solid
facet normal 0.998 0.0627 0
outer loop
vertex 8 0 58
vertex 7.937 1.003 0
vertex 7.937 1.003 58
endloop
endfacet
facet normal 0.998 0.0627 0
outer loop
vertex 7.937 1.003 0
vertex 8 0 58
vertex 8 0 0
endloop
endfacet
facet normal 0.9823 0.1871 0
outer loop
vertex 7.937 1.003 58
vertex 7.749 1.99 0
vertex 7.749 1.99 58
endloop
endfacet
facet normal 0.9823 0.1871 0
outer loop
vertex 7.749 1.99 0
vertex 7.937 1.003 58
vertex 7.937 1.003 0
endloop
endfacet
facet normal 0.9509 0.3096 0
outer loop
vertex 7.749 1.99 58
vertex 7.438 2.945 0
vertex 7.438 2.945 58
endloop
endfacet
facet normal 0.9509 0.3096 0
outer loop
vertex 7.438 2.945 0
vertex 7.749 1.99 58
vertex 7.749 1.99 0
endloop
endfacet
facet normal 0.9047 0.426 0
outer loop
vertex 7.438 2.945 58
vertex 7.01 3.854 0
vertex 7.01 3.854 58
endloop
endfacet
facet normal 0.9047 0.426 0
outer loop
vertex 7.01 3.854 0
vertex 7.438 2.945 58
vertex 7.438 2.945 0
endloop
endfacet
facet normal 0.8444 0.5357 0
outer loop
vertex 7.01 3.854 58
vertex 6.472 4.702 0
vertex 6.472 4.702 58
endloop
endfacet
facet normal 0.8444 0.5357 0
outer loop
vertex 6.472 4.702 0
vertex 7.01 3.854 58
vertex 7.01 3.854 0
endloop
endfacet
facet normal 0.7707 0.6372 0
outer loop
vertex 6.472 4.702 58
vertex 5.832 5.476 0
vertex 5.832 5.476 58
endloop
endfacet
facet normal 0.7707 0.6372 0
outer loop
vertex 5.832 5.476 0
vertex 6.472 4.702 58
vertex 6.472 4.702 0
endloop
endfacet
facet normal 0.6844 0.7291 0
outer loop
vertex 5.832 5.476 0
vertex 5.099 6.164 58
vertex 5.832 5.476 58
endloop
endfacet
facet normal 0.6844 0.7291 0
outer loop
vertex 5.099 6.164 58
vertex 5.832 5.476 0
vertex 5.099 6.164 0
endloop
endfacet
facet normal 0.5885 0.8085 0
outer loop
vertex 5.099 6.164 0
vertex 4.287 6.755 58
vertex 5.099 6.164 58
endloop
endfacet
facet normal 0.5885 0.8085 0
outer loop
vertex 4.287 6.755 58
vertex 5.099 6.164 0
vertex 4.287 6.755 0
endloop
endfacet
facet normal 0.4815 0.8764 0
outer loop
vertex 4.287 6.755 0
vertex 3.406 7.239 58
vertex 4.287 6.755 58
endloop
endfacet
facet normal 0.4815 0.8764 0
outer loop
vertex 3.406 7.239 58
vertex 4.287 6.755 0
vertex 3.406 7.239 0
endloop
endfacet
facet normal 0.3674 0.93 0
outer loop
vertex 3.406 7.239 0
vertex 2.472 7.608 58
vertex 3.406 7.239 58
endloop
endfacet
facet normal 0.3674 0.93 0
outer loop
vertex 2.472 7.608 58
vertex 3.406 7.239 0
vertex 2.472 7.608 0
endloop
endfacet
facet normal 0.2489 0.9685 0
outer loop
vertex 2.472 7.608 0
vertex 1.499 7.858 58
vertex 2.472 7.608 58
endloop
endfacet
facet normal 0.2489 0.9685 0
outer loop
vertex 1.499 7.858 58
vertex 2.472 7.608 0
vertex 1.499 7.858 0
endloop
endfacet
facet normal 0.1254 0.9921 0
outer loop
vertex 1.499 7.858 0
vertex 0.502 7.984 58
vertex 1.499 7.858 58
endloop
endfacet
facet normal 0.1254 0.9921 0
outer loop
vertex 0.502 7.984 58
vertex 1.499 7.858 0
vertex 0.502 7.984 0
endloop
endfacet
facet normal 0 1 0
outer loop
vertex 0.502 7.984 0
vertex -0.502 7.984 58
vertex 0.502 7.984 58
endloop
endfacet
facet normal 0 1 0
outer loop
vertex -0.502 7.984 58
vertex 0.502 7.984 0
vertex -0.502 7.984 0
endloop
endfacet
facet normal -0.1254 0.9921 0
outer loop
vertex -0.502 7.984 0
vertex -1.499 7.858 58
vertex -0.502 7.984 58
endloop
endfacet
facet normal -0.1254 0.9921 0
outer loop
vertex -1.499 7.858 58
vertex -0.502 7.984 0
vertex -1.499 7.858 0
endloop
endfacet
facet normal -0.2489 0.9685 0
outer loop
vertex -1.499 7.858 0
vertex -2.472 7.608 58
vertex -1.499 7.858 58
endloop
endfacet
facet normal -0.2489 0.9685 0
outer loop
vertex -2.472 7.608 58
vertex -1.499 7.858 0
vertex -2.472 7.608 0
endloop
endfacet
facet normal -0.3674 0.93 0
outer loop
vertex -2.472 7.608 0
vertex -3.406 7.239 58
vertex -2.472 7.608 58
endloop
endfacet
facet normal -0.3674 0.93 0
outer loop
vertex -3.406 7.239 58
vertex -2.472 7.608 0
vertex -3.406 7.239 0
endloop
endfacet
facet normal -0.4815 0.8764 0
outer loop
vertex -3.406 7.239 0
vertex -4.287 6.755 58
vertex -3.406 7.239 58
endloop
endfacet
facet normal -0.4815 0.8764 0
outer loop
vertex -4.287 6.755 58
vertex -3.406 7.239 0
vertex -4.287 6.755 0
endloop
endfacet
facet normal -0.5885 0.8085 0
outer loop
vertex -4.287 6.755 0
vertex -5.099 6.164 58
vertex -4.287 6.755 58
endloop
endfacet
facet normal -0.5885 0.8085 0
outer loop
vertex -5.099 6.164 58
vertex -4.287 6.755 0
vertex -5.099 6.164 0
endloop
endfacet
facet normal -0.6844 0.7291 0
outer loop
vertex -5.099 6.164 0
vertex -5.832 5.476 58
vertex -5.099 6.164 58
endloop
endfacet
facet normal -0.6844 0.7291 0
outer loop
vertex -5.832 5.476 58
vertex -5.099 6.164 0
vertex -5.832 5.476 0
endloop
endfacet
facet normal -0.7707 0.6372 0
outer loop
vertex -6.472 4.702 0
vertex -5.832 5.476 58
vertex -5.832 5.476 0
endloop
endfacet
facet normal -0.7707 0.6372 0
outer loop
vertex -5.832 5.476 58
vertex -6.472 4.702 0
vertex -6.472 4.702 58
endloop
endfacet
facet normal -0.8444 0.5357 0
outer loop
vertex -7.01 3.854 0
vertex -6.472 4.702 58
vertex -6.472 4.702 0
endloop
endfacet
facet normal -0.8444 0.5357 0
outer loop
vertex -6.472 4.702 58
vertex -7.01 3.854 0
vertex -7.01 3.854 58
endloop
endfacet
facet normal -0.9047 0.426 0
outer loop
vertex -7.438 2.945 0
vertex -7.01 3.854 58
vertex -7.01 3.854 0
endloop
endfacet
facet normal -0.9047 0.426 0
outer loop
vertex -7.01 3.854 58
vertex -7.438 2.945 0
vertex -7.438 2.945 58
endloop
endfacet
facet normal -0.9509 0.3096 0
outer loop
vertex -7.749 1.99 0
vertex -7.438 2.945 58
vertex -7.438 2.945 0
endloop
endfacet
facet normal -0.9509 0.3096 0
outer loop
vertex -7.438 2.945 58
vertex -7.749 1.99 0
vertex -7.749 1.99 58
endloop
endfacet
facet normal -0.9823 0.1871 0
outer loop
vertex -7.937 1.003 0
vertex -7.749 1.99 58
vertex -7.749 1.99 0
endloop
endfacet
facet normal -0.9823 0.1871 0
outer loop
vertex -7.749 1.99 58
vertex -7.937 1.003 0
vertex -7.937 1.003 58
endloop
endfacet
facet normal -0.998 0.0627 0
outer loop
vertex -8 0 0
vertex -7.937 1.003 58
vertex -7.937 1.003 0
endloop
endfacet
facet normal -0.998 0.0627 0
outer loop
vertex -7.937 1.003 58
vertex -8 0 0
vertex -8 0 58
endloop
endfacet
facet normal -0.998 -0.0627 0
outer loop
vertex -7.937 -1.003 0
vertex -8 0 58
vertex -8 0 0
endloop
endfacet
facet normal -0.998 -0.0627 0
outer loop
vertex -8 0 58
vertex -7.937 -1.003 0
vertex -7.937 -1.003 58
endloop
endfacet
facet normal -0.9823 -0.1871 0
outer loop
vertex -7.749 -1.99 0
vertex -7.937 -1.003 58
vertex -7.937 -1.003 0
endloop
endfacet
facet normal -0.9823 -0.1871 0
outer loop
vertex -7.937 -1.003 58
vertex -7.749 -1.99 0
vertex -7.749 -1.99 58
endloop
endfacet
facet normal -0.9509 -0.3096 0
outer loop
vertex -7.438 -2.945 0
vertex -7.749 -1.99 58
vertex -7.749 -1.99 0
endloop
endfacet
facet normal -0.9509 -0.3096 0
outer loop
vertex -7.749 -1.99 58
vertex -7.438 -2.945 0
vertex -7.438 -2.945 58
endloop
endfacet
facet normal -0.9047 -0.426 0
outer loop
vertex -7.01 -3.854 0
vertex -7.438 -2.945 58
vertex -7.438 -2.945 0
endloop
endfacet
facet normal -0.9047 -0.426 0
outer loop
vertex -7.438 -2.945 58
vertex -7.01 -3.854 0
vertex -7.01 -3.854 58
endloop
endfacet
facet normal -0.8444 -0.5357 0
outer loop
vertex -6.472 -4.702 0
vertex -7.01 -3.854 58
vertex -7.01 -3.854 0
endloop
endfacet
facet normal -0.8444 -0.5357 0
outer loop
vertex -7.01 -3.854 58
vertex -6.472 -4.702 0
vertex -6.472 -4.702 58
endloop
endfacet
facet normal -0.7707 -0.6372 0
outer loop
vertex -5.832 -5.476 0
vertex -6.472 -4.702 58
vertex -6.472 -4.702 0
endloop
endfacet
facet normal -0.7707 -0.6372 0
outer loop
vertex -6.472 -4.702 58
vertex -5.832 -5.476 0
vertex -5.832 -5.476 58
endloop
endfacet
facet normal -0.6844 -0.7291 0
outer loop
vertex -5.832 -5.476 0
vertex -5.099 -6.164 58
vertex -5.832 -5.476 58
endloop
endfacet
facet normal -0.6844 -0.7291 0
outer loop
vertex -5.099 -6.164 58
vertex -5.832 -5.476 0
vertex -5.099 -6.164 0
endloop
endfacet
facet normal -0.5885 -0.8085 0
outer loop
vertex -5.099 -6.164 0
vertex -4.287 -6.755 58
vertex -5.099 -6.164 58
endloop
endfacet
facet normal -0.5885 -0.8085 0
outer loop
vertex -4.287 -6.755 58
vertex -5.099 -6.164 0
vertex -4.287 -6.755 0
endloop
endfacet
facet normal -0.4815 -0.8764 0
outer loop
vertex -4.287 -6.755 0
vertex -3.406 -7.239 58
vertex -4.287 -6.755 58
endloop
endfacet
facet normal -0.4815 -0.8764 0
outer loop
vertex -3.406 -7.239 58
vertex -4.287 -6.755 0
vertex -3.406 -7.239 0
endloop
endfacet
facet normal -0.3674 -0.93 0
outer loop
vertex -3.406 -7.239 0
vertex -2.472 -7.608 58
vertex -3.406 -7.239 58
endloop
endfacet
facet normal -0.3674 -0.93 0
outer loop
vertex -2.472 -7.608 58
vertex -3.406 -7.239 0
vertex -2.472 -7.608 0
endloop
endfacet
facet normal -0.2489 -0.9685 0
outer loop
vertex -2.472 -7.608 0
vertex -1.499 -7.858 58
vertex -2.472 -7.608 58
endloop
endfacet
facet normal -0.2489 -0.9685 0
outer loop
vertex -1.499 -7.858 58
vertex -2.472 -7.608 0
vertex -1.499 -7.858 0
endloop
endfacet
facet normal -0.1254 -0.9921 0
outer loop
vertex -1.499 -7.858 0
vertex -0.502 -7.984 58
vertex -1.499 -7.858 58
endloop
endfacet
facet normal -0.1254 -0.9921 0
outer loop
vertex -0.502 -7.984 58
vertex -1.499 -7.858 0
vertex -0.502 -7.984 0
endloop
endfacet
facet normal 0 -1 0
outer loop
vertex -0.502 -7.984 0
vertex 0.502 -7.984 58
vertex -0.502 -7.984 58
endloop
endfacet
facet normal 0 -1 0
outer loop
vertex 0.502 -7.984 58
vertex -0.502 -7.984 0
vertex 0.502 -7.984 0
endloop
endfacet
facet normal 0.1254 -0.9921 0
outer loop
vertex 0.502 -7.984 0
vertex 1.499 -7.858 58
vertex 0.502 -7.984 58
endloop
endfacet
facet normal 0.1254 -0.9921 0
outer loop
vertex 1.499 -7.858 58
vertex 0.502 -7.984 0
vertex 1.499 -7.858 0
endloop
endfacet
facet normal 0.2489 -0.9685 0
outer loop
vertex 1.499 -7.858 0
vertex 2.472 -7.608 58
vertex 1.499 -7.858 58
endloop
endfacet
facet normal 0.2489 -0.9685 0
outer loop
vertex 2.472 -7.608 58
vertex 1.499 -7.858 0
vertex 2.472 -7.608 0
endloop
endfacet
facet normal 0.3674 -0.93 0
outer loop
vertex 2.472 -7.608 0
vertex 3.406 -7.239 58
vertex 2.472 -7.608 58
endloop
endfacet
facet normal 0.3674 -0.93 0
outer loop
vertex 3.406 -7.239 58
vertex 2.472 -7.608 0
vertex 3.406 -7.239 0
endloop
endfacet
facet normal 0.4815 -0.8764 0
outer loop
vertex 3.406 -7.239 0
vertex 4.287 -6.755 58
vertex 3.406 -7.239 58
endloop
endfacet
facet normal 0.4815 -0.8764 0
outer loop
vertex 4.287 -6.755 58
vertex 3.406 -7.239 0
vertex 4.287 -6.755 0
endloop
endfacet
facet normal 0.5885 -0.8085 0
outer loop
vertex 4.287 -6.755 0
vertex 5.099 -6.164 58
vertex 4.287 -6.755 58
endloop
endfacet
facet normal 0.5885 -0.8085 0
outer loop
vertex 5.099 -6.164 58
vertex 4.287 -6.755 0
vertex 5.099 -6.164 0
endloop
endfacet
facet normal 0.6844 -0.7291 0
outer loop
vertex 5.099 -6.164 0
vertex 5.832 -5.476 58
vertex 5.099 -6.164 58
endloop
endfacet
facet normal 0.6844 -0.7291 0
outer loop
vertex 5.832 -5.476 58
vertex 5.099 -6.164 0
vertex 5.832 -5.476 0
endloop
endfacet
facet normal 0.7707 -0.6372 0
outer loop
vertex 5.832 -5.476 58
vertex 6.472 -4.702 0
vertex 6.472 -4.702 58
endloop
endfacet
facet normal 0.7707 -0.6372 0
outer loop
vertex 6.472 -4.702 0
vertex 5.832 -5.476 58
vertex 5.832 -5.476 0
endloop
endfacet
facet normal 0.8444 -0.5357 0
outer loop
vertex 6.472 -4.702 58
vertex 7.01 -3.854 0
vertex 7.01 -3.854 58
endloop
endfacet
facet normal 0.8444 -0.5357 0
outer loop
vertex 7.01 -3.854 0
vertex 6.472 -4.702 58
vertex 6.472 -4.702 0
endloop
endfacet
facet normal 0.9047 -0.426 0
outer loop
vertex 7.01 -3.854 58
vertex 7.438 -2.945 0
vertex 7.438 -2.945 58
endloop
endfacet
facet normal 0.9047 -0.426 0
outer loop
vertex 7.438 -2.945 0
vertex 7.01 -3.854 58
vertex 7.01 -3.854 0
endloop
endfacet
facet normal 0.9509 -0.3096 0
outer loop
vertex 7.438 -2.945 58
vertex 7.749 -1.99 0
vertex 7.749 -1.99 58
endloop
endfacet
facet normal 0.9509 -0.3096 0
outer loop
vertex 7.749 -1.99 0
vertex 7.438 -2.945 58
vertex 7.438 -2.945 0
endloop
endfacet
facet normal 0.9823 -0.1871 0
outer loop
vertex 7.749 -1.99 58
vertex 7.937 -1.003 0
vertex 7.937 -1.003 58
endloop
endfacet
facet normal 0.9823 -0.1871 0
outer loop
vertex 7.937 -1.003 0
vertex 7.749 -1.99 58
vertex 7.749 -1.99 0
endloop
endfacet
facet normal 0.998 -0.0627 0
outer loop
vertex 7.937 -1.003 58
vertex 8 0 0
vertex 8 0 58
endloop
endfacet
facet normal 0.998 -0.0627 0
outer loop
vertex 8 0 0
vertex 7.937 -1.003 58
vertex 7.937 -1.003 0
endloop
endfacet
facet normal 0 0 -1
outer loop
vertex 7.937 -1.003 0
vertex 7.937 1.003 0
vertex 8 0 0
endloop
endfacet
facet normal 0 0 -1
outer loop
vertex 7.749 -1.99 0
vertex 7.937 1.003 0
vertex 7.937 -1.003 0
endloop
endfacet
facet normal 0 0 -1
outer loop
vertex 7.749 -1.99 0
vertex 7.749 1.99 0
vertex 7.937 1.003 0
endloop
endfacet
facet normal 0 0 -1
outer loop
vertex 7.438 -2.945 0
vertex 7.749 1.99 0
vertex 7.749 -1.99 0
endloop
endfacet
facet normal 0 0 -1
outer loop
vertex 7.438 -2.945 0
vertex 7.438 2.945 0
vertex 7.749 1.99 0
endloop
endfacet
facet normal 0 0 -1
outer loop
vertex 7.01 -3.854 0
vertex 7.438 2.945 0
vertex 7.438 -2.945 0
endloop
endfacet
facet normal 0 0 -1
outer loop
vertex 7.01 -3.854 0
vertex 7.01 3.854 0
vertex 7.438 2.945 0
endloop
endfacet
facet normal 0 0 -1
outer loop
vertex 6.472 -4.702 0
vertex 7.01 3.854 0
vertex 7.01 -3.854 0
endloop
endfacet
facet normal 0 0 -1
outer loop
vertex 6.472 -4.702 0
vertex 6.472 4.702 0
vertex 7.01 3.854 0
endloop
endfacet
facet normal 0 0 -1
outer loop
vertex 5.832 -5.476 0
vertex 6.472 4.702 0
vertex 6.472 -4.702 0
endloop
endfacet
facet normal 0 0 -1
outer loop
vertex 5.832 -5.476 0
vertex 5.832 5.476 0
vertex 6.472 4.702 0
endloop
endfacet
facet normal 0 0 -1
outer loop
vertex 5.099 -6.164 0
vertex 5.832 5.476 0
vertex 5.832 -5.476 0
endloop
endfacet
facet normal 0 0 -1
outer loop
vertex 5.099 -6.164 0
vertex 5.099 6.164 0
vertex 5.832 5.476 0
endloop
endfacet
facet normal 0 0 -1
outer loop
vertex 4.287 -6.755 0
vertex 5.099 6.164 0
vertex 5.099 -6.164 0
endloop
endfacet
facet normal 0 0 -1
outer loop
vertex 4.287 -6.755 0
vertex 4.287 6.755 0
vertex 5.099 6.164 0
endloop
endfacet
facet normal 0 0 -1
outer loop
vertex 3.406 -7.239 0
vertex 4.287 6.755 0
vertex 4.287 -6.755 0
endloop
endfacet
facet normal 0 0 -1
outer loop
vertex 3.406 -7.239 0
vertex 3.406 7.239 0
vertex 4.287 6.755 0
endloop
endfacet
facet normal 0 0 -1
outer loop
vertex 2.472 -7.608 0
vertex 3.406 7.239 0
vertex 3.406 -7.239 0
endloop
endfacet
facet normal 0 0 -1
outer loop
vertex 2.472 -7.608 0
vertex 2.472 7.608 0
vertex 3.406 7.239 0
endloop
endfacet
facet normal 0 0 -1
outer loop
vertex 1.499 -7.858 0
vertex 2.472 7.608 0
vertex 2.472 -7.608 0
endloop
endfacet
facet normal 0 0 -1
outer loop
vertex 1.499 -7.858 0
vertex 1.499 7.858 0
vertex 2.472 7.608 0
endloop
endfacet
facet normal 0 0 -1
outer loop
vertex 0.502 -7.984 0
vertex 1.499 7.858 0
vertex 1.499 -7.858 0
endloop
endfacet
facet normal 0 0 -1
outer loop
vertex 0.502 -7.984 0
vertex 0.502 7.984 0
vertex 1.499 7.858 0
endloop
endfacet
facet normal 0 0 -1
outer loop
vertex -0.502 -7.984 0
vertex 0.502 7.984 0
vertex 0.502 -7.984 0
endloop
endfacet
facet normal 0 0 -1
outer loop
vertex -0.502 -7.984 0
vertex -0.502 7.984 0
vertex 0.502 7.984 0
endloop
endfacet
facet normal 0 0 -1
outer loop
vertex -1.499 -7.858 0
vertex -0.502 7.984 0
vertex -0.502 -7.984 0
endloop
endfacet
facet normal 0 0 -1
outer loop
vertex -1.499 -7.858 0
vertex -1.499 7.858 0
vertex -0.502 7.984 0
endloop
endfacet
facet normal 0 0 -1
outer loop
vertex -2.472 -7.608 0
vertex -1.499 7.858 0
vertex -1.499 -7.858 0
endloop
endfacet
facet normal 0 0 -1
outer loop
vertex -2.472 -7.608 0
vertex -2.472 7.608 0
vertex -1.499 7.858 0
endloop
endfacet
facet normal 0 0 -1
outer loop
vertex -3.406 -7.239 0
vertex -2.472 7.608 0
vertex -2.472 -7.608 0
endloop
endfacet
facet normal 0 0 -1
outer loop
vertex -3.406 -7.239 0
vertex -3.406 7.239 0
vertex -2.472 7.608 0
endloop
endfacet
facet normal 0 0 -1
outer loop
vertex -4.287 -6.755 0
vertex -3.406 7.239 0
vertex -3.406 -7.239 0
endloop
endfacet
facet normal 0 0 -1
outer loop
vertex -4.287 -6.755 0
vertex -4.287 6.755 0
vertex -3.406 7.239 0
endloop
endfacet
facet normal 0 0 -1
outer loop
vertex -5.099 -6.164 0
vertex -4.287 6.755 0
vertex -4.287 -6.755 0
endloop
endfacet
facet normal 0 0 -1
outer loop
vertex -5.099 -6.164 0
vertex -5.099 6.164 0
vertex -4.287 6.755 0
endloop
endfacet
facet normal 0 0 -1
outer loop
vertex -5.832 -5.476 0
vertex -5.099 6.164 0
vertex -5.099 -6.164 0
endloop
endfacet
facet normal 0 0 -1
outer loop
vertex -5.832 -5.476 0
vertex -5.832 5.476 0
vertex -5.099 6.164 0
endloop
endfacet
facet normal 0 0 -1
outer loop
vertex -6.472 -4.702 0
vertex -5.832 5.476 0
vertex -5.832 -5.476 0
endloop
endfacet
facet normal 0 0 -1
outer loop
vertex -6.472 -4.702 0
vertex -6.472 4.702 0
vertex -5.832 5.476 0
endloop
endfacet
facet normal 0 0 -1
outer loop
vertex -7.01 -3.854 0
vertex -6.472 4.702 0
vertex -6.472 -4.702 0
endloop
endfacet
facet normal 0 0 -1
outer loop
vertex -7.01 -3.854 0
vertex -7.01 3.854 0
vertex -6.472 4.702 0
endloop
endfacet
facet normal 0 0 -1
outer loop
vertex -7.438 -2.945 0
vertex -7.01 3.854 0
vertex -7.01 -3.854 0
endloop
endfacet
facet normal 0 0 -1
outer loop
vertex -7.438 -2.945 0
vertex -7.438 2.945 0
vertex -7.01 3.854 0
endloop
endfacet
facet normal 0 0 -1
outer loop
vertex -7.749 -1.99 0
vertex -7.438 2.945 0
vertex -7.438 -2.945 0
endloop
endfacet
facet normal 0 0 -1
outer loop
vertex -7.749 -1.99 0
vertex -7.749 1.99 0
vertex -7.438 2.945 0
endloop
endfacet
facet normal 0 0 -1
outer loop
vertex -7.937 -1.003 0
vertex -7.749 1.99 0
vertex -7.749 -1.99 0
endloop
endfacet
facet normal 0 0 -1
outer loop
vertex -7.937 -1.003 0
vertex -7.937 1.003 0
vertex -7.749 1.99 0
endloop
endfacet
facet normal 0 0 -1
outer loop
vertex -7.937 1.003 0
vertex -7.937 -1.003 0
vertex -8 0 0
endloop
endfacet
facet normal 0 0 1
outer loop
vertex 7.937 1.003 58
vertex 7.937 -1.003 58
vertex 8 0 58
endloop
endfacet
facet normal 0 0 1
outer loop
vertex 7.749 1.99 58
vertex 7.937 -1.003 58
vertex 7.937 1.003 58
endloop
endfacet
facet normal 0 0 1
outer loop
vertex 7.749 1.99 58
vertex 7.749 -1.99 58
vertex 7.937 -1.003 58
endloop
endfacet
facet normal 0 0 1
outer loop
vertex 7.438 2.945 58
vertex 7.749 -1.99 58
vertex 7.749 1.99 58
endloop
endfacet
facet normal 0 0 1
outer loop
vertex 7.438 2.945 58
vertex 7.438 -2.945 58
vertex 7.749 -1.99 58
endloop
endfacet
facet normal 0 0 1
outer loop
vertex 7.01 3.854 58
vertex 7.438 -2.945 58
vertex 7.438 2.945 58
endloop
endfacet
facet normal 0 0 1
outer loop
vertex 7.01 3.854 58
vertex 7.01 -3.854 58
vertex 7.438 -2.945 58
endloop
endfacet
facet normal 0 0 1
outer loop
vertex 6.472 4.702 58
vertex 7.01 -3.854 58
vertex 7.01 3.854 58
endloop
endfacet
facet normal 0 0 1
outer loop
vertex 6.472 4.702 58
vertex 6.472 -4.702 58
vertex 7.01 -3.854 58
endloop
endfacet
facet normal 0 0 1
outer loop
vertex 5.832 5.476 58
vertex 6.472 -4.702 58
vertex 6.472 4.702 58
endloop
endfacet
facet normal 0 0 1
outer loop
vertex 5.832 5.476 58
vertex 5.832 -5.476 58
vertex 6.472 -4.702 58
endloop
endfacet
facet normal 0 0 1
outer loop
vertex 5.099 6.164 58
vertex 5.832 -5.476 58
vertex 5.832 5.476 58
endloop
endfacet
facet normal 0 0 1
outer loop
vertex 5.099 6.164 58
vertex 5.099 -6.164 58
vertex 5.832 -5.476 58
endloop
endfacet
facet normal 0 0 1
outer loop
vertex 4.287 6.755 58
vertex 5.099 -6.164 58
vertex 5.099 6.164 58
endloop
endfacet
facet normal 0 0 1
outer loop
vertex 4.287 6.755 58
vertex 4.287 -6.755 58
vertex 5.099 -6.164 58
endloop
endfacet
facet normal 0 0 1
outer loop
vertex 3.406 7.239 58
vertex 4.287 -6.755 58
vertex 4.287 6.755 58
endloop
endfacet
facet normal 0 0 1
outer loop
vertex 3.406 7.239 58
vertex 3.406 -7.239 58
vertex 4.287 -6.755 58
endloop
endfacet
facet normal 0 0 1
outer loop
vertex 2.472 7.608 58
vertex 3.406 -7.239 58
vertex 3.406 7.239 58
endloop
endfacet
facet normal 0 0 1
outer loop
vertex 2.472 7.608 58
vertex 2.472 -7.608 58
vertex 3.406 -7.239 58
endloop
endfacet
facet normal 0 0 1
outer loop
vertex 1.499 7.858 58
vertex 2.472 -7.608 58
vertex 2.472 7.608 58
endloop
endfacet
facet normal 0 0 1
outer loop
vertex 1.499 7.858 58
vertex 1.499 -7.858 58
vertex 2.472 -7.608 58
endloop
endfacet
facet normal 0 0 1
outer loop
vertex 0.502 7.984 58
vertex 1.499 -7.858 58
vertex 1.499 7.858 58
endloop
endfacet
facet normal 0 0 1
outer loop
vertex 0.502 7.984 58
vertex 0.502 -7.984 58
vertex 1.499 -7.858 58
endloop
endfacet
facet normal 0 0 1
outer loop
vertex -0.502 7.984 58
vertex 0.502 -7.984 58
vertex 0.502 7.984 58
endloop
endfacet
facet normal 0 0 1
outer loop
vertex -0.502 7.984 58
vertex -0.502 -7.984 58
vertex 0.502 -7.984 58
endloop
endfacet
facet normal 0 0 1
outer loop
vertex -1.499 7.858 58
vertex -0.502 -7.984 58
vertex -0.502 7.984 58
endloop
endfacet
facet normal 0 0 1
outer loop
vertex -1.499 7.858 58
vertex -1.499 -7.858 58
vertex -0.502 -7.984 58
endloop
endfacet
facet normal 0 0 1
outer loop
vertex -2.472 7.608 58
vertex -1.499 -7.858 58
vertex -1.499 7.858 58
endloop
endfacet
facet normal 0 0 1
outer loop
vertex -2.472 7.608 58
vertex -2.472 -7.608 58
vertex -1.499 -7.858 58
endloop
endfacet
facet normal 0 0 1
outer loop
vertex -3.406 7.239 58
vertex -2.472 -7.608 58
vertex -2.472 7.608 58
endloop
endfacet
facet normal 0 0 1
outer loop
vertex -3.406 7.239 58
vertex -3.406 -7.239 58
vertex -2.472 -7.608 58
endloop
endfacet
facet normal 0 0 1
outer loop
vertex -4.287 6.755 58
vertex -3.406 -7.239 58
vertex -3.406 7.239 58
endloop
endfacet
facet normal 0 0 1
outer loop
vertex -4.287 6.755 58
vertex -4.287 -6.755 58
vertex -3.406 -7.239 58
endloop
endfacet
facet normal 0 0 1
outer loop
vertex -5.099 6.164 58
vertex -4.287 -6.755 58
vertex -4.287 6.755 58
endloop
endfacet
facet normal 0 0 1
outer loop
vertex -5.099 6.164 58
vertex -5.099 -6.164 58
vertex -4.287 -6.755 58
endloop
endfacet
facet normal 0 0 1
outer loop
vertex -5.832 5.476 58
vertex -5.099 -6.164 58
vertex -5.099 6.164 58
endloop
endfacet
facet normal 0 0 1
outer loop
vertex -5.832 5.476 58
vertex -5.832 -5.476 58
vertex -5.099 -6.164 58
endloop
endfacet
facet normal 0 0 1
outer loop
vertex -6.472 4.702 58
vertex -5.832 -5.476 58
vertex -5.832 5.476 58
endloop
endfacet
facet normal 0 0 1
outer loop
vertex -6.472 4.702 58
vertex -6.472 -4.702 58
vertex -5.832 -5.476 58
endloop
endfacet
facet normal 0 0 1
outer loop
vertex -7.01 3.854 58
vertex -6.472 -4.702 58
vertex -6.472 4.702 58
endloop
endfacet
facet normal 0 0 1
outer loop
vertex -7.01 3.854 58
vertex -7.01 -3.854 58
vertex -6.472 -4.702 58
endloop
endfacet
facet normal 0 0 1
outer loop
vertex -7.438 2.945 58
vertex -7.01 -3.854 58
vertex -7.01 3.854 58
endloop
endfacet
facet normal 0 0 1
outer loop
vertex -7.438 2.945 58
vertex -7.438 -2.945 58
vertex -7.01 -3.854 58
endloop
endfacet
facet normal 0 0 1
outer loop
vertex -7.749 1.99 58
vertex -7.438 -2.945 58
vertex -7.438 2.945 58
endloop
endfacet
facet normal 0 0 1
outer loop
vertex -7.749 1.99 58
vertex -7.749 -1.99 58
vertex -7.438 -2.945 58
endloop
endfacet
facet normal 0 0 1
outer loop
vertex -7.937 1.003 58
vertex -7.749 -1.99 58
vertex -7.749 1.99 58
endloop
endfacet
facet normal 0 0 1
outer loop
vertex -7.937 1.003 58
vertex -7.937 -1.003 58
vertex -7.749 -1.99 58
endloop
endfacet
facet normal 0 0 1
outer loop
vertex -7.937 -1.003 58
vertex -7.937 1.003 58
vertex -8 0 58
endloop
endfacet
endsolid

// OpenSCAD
$fn=50;
function HotEndDiam() = 16;
function HotEndRecessDiam() = 7;
function HotEndRecessHeight() = 2;
function HotEndRecessDepth() = 1.95;
function HotEndRecessOffset() = 2.6;
function HotEndLength() = 58;

module HotEnd(ScrewChannel=false){
	if(ScrewChannel==false){	
		cylinder(HotEndLength(), HotEndDiam()/2,HotEndDiam()/2);
	}else{
		difference(){
			cylinder(HotEndLength(), HotEndDiam()/2,HotEndDiam()/2);
			translate([0,0,HotEndLength()-HotEndRecessOffset()]){
				difference(){
					cylinder(HotEndRecessHeight(),HotEndDiam()/2+1,HotEndDiam()/2+1);
					cylinder(HotEndRecessHeight(),(HotEndDiam()-HotEndRecessDepth())/2+.4,(HotEndDiam()-HotEndRecessDepth())/2+.4);
				}
			}
		}
	}
}

HotEnd(false);		
